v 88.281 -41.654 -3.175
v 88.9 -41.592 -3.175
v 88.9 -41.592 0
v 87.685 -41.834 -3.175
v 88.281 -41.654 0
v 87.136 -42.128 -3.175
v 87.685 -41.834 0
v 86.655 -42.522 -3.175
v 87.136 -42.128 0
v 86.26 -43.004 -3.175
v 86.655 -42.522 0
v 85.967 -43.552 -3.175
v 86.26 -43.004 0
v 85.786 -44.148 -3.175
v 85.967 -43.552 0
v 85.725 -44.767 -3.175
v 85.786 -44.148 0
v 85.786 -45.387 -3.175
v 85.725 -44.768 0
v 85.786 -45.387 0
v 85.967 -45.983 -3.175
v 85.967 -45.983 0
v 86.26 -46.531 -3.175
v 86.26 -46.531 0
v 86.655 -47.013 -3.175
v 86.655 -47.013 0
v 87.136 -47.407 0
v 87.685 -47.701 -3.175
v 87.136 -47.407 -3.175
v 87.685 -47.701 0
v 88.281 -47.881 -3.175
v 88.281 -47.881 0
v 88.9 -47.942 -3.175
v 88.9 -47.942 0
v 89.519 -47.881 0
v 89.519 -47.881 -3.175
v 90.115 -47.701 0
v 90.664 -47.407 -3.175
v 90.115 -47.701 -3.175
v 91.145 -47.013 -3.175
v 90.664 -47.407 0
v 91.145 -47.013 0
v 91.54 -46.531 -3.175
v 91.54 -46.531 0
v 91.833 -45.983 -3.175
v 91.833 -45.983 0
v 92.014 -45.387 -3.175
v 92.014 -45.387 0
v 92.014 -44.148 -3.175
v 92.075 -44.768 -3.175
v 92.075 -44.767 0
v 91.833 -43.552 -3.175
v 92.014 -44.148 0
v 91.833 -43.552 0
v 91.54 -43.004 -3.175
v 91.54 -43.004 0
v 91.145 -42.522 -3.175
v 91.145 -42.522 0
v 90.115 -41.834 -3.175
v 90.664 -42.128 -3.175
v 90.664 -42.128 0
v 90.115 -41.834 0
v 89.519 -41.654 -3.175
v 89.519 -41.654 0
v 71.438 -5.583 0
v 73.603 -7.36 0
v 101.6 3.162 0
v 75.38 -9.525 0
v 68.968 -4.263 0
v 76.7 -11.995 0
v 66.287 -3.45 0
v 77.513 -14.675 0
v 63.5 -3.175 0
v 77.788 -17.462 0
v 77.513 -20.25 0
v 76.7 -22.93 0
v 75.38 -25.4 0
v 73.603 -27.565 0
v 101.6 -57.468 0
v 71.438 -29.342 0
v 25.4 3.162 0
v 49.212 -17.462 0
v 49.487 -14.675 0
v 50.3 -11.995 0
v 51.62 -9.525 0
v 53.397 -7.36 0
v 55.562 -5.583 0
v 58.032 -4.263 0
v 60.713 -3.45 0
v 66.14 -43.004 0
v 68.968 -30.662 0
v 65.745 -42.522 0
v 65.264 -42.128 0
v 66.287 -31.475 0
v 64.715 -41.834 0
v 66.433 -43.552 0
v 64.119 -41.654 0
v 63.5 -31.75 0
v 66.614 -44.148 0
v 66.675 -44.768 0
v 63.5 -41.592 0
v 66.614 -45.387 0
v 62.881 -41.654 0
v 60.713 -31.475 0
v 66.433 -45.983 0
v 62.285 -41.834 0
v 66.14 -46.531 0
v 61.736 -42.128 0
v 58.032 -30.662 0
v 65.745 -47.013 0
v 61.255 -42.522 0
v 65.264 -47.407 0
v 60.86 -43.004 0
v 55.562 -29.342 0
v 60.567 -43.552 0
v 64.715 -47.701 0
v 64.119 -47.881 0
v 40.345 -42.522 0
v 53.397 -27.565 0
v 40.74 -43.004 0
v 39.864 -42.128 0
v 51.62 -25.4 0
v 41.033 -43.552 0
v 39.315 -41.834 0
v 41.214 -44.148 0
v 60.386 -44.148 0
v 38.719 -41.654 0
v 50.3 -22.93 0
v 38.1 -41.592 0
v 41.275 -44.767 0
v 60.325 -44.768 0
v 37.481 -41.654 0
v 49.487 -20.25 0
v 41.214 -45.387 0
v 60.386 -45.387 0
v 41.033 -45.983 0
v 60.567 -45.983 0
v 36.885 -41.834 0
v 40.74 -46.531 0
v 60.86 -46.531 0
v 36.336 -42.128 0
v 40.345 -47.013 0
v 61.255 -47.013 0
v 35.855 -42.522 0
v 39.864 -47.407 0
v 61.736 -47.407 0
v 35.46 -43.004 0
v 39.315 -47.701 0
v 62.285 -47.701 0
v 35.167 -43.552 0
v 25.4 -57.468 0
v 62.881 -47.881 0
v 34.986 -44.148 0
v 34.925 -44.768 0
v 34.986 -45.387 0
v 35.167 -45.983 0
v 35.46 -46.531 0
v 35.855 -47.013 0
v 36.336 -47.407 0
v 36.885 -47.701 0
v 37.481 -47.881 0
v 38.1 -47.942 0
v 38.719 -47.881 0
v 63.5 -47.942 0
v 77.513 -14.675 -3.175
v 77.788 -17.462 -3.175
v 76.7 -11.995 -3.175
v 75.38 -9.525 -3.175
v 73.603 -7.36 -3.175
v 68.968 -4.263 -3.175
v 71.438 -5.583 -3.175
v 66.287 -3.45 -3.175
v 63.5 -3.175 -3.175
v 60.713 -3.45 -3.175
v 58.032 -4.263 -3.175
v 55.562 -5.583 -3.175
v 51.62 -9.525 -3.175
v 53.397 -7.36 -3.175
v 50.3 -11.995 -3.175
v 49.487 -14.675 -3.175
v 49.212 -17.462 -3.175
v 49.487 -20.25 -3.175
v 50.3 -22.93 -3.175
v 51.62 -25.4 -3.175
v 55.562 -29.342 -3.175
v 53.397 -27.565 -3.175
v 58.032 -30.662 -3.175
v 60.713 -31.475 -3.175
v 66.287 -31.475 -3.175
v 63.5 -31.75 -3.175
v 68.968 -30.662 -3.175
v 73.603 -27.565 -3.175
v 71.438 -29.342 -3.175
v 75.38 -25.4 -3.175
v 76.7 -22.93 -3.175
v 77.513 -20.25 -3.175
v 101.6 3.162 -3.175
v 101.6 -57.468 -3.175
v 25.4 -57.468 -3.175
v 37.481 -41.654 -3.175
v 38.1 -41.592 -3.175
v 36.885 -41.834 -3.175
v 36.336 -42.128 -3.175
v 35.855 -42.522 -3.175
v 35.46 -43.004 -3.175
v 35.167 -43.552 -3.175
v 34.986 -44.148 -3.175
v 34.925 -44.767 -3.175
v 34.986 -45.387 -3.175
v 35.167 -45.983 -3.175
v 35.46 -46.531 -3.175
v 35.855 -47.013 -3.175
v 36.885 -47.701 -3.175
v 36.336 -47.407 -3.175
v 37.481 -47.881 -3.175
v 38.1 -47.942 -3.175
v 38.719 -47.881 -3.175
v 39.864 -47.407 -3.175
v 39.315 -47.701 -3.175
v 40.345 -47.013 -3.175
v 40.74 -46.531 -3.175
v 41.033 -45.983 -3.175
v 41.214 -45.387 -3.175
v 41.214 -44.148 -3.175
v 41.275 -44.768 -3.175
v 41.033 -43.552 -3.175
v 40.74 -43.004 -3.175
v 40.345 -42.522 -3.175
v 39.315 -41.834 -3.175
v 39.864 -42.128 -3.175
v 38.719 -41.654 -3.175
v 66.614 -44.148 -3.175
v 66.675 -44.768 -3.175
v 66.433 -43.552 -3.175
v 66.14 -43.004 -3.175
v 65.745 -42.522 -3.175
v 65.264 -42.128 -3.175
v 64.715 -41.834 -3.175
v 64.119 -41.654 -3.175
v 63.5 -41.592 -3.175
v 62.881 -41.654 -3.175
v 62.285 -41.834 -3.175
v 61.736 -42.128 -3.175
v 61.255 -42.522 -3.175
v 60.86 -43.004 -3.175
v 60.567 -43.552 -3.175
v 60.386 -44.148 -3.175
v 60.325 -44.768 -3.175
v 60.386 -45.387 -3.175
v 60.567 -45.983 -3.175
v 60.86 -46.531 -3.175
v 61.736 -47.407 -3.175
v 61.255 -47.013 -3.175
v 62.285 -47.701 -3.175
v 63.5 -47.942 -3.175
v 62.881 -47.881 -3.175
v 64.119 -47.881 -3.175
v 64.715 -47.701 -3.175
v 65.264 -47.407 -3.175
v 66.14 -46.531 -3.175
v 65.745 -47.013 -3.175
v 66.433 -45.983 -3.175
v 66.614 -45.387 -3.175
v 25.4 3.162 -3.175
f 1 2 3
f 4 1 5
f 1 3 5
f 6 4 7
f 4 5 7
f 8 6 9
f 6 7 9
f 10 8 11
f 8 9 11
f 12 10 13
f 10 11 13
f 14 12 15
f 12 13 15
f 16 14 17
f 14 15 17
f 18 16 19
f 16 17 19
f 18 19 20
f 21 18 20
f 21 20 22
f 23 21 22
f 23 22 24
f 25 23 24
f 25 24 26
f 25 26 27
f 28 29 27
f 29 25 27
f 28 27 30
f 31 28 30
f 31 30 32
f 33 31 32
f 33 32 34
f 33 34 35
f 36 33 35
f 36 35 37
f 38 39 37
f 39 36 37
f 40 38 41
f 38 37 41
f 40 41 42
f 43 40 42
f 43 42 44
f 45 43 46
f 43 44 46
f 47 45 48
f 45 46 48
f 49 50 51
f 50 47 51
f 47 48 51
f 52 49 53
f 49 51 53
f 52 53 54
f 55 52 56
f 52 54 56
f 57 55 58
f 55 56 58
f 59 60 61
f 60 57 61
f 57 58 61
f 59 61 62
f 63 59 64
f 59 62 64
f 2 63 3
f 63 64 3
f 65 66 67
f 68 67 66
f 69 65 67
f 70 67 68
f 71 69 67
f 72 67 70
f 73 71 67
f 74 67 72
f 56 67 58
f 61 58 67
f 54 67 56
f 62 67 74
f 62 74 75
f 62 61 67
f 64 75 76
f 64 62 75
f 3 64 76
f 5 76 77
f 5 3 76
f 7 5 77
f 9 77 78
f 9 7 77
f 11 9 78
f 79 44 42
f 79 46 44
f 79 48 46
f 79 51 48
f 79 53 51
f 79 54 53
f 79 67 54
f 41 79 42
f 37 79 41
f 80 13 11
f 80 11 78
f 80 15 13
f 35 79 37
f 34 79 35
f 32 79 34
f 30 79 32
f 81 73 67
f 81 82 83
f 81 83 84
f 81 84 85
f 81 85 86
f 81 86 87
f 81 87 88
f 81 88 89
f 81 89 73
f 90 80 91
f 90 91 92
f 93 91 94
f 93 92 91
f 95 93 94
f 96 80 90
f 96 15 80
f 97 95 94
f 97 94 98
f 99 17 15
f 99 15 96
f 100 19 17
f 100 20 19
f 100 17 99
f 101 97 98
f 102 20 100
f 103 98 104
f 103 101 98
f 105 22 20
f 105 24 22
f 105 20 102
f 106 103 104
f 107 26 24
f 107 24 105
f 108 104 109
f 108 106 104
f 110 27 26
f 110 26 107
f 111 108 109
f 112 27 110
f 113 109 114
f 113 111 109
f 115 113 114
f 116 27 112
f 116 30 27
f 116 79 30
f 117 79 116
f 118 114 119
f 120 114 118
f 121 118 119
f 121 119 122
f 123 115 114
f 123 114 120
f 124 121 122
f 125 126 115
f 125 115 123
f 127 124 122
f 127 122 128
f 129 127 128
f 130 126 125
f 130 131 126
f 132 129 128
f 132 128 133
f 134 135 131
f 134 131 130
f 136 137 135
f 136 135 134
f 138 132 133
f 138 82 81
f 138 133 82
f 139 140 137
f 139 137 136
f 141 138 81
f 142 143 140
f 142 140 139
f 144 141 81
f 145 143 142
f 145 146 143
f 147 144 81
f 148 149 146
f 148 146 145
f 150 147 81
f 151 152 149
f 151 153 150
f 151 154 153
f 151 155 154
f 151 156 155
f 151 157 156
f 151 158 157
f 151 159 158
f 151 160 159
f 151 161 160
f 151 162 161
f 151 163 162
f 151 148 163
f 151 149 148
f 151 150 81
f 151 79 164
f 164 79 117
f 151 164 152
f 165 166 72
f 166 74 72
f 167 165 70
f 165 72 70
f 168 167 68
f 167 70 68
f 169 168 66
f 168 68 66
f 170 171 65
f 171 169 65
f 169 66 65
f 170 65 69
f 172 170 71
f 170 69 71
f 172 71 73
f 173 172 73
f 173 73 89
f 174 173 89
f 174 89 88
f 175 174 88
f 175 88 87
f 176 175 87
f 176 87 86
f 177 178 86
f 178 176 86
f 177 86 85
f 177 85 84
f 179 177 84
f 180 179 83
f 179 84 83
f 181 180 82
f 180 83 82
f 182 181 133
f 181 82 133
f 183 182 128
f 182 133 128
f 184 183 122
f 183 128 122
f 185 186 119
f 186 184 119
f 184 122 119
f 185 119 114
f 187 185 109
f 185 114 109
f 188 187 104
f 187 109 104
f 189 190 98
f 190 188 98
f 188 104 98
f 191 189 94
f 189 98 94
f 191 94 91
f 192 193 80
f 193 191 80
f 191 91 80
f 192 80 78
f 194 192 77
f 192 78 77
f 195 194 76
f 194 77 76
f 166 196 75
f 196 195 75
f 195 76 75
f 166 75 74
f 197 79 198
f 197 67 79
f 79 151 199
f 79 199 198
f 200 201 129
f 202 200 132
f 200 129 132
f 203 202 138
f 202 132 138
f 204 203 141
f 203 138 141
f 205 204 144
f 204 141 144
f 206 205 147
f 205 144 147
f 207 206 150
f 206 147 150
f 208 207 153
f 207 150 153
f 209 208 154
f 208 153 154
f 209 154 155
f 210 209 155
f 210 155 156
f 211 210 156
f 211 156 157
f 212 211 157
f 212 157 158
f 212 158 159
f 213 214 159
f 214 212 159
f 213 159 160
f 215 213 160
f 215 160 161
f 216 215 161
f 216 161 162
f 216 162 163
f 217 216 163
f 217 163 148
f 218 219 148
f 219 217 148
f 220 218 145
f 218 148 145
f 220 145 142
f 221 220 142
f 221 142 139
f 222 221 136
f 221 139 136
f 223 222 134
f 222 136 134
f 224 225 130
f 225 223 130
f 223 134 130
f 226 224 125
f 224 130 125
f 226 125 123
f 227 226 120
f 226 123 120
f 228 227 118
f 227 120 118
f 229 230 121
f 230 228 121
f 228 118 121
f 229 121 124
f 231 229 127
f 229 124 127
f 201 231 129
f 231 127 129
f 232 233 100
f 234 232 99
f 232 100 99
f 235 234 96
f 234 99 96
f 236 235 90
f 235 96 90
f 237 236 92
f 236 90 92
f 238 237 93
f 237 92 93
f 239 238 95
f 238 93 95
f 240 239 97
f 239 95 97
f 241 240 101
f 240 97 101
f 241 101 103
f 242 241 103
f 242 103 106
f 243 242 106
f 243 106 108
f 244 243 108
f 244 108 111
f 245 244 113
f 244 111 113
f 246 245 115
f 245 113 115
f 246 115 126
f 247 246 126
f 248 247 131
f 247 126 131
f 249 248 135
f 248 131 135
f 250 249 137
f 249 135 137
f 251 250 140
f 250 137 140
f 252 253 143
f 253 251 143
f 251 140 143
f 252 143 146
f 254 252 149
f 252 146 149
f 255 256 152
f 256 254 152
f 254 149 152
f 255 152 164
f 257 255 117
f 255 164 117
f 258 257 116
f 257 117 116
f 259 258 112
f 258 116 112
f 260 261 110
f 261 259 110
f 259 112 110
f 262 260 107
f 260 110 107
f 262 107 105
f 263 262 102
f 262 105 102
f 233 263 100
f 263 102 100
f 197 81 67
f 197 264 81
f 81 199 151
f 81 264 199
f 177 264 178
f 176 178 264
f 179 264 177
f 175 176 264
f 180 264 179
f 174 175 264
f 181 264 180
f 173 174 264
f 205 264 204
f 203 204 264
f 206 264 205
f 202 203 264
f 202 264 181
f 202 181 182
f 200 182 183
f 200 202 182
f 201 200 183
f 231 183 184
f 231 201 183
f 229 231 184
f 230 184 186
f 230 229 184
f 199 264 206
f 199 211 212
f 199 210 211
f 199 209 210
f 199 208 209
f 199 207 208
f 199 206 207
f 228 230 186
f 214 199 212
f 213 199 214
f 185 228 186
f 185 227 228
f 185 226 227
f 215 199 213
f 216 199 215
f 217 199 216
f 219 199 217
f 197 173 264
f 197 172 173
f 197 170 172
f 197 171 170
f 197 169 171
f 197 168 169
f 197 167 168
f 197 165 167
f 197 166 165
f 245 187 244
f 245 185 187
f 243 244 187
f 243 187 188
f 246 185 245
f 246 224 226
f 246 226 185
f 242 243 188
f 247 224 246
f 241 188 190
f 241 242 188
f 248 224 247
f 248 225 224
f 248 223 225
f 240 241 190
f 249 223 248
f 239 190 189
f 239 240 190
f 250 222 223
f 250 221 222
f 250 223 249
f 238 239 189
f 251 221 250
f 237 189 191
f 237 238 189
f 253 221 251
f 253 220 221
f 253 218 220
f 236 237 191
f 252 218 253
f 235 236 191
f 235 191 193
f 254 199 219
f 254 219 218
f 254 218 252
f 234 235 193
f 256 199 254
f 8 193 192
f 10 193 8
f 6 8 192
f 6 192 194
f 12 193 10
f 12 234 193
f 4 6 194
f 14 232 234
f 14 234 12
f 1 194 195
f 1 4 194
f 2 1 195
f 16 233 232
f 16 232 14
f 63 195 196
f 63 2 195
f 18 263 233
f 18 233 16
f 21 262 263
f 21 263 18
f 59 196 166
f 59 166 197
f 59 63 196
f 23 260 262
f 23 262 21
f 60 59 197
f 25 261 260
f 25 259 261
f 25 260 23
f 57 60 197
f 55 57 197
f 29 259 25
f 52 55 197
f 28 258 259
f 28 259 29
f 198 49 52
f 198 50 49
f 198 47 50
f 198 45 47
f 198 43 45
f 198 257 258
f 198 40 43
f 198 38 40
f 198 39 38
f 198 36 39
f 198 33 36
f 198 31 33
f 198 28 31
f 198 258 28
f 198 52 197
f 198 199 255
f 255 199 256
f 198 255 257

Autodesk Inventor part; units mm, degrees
ref_plane "YZ Plane" through (0, 0, 0) normal (1, 0, 0) x (0, 1, 0)
ref_plane "XZ Plane" through (0, 0, 0) normal (0, 1, 0) x (-1, 0, 0)
ref_plane "XY Plane" through (0, 0, 0) normal (0, 0, 1) x (1, 0, 0)
sketch "Sketch1" plane through (0, 0, 0) normal (1, 0, 0) x (0, 1, 0)
  line L0 (0, 0) -> (-50.8, 0)
  line L1 (-50.8, 0) -> (-50.8, -25.4)
  line L2 (-50.8, -25.4) -> (0, -25.4)
  line L3 (0, -25.4) -> (0, 0)
  line L4 (-3.175, -3.175) -> (-47.625, -3.175)
  line L5 (-47.625, -3.175) -> (-47.625, -22.225)
  line L6 (-47.625, -22.225) -> (-3.175, -22.225)
  line L7 (-3.175, -22.225) -> (-3.175, -3.175)
  dimension "d0" = 50.8
  dimension "d1" = 25.4
  dimension "d2" = 3.175
extrude "Extrusion1" add sketch "Sketch1" along normal blind 127
sketch "Sketch2" plane through (0, -50.8, 0) normal (0, 0, 1) x (1, 0, 0)
  line L0 (0, 50.8) -> (0, 0) projected
  line L1 (0, 0) -> (127, 0) projected
  line L2 (127, 50.8) -> (127, 0) projected
  line L3 (0, 50.8) -> (127, 50.8) projected
  circle A0 centre (63.5, 6.0325) radius 3.175
  circle A1 centre (63.5, 33.3375) radius 6.35
  circle A2 centre (63.5, 33.3375) radius 14.2875
  circle A3 centre (63.5, 33.3375) radius 7.62
  circle A4 centre (63.5, 33.3375) radius 15.875
  line L4 (0, 47.625) -> (127, 47.625) projected
  dimension "d5" = 6.35
  dimension "d6" = 12.7
  dimension "d9" = 28.575
  dimension "d10" = 15.24
  dimension "d11" = 31.75
  dimension "d12" = 14.2875
  dimension "d13" = 16.51
extrude "Extrusion2" cut sketch "Sketch2" against normal blind 127 contours A2 | A0 | A1 | A3
sketch "Sketch3" plane through (0, -50.8, -25.4) normal (0, 0, -1) x (-1, 0, 0)
  circle A0 centre (-63.5, 33.3375) radius 14.2875 projected
  circle A1 centre (-63.5, 6.0325) radius 3.175 projected
  line L0 (0, 0) -> (0, 50.8) projected
  line L1 (0, 50.8) -> (-127, 50.8) projected
  line L2 (-127, 0) -> (-127, 50.8) projected
  line L3 (0, 0) -> (-127, 0) projected
  point P0 (-38.1, 6.0325)
  point P1 (-12.7, 6.0325)
  point P2 (-88.9, 6.0325)
  point P3 (-114.3, 6.0325)
  dimension "d16" = 25.4
  dimension "d17" = 25.4
  dimension "d18" = 25.4
  dimension "d19" = 25.4
hole "Hole1" at (38.1, -44.7675, -25.4) at (12.7, -44.7675, -25.4) at (88.9, -44.7675, -25.4) at (114.3, -44.7675, -25.4) direction (0, 0, 1) diameter 6.35 end through all
sketch "Sketch4" plane through (0, 0, 0) normal (-1, 0, 0) x (0, 0, 1)
  line L0 (0, 0) -> (-25.4, 0)
  line L1 (-25.4, 0) -> (-25.4, -101.6)
  line L2 (-25.4, -101.6) -> (0, -101.6)
  line L3 (0, -101.6) -> (0, 0)
  line L4 (-3.175, -98.425) -> (-22.225, -98.425)
  line L5 (-22.225, -98.425) -> (-22.225, -3.175)
  line L6 (-22.225, -3.175) -> (-3.175, -3.175)
  line L7 (-3.175, -3.175) -> (-3.175, -98.425)
  line L8 (-3.175, -47.625) -> (-3.175, -3.175) projected
  line L9 (-22.225, -61.2712) -> (-3.175, -61.2712)
  line L10 (-3.175, -61.2712) -> (-3.175, -33.0722)
  line L11 (-3.175, -33.0722) -> (-22.225, -33.0722)
  line L12 (-22.225, -33.0722) -> (-22.225, -61.2712)
  line L13 (-22.225, -3.175) -> (-3.175, -3.175) projected
  line L14 (-3.175, -3.175) -> (-3.175, -47.625) projected
  line L15 (-3.175, -47.625) -> (-22.225, -47.625) projected
  line L16 (-22.225, -47.625) -> (-22.225, -3.175) projected
  line L17 (0, 0) -> (0, -50.8) projected
  line L18 (-25.4, 0) -> (0, 0) projected
  line L19 (-25.4, -50.8) -> (-25.4, 0) projected
  line L20 (0, -50.8) -> (-25.4, -50.8) projected
  line L21 (-25.4, -50.8) -> (-22.225, -50.8)
  line L22 (0, -50.8) -> (-25.4, -50.8) projected
  line L23 (-3.175, -50.8) -> (0, -50.8)
  dimension "d27" = 25.4
  dimension "d28" = 101.6
  dimension "d29" = 3.175
extrude "Extrusion3" cut sketch "Sketch4" against normal blind 127 contours L20 L5 L15 L7 | L7 L9 L5 L20 | L15 L5 L11 L7
extrude "Extrusion4" add sketch "Sketch4" against normal blind 127 contours L3 L2 L1 L20 L5 L4 L7
sketch "Sketch5" plane through (127, 0, -25.4) normal (0, 0, -1) x (-1, 0, 0)
  line L0 (-34.6309, 15.7259) -> (-18.4019, -170.3675)
  line L1 (-18.4019, -170.3675) -> (166.6096, -150.8926)
  line L2 (166.6096, -150.8926) -> (166.6096, -41.3464)
  line L3 (166.6096, -41.3464) -> (138.7497, 15.7259)
  line L4 (138.7497, 15.7259) -> (-34.6309, 15.7259)
  point P0 (127, 0)
extrude "Extrusion5" cut sketch "Sketch5" against normal blind 22.225
sketch "Sketch6" plane through (0, 0, 0) normal (0, 0, 1) x (1, 0, 0)
  circle A0 centre (12.7, -44.7675) radius 3.175 projected
  line L0 (12.7, -44.7675) -> (0, -44.7675)
  line L1 (0, 0) -> (0, -101.6) projected
  line L2 (0, -44.7675) -> (0, -57.4675)
  line L3 (0, -57.4675) -> (127, -57.4675)
  line L4 (127, 0) -> (127, -101.6) projected
  line L5 (12.7, -44.7675) -> (127, -44.7675)
  line L6 (127, -44.7675) -> (127, -57.4675)
  line L7 (127, -57.4675) -> (144.4596, -106.2687)
  line L8 (144.4596, -106.2687) -> (111.8065, -115.7811)
  line L9 (111.8065, -115.7811) -> (9.525, -135.9925)
  line L10 (9.525, -135.9925) -> (-52.3397, -101.6)
  line L11 (-52.3397, -101.6) -> (0, -57.4675)
  dimension "d36" = 12.7
  dimension "d37" = 12.7
extrude "Extrusion6" cut sketch "Sketch6" against normal blind 22.225 contours L7 L8 L9 L10 L11 L3
sketch "Sketch7" plane through (0, -57.4675, 0) normal (0, -1, 0) x (1, 0, 0)
  line L0 (127, -3.175) -> (127, 0)
  line L1 (0, 0) -> (127, 0) projected
  line L2 (127, 0) -> (0, 0)
  line L3 (0, 0) -> (0, -3.175)
  line L4 (0, -3.175) -> (127, -3.175)
  line L5 (127, -3.175) -> (0, -3.175) projected
sketch "Sketch8" plane through (0, 0, 0) normal (0, 1, 0) x (1, 0, 0)
  line L0 (0, 0) -> (0, 3.175)
  line L1 (0, 3.175) -> (127, 3.175)
  line L2 (127, 3.175) -> (127, 0)
  line L3 (127, 0) -> (0, 0)
extrude "Extrusion8" add sketch "Sketch8" along normal blind 3.1623
sketch "Sketch9" plane through (127, 0, 0) normal (1, 0, 0) x (0, 0, -1)
  line L0 (0, 3.1623) -> (3.175, 3.1623)
  line L1 (3.175, 3.1623) -> (0, 3.1623) projected
  line L2 (3.175, 3.1623) -> (3.175, -57.4675)
  line L3 (3.175, -57.4675) -> (0, -57.4675)
  line L4 (0, -57.4675) -> (3.175, -57.4675) projected
  line L5 (0, -57.4675) -> (0, 3.1623)
  point P0 (0, 0)
extrude "Extrusion9" cut sketch "Sketch9" against normal blind 25.4
sketch "Sketch10" plane through (0, 0, 0) normal (-1, 0, 0) x (0, 0, 1)
  line L0 (0, 3.1623) -> (0, -57.4675)
  line L1 (0, -57.4675) -> (-3.175, -57.4675)
  line L2 (-3.175, -57.4675) -> (-3.175, 3.1623)
  line L3 (-3.175, 3.1623) -> (-3.175, -57.4675) projected
  line L4 (-3.175, 3.1623) -> (0, 3.1623)
  point P0 (0, 0)
extrude "Extrusion10" cut sketch "Sketch10" against normal blind 25.4
properties part number "Elevator Shaft Mounts"
